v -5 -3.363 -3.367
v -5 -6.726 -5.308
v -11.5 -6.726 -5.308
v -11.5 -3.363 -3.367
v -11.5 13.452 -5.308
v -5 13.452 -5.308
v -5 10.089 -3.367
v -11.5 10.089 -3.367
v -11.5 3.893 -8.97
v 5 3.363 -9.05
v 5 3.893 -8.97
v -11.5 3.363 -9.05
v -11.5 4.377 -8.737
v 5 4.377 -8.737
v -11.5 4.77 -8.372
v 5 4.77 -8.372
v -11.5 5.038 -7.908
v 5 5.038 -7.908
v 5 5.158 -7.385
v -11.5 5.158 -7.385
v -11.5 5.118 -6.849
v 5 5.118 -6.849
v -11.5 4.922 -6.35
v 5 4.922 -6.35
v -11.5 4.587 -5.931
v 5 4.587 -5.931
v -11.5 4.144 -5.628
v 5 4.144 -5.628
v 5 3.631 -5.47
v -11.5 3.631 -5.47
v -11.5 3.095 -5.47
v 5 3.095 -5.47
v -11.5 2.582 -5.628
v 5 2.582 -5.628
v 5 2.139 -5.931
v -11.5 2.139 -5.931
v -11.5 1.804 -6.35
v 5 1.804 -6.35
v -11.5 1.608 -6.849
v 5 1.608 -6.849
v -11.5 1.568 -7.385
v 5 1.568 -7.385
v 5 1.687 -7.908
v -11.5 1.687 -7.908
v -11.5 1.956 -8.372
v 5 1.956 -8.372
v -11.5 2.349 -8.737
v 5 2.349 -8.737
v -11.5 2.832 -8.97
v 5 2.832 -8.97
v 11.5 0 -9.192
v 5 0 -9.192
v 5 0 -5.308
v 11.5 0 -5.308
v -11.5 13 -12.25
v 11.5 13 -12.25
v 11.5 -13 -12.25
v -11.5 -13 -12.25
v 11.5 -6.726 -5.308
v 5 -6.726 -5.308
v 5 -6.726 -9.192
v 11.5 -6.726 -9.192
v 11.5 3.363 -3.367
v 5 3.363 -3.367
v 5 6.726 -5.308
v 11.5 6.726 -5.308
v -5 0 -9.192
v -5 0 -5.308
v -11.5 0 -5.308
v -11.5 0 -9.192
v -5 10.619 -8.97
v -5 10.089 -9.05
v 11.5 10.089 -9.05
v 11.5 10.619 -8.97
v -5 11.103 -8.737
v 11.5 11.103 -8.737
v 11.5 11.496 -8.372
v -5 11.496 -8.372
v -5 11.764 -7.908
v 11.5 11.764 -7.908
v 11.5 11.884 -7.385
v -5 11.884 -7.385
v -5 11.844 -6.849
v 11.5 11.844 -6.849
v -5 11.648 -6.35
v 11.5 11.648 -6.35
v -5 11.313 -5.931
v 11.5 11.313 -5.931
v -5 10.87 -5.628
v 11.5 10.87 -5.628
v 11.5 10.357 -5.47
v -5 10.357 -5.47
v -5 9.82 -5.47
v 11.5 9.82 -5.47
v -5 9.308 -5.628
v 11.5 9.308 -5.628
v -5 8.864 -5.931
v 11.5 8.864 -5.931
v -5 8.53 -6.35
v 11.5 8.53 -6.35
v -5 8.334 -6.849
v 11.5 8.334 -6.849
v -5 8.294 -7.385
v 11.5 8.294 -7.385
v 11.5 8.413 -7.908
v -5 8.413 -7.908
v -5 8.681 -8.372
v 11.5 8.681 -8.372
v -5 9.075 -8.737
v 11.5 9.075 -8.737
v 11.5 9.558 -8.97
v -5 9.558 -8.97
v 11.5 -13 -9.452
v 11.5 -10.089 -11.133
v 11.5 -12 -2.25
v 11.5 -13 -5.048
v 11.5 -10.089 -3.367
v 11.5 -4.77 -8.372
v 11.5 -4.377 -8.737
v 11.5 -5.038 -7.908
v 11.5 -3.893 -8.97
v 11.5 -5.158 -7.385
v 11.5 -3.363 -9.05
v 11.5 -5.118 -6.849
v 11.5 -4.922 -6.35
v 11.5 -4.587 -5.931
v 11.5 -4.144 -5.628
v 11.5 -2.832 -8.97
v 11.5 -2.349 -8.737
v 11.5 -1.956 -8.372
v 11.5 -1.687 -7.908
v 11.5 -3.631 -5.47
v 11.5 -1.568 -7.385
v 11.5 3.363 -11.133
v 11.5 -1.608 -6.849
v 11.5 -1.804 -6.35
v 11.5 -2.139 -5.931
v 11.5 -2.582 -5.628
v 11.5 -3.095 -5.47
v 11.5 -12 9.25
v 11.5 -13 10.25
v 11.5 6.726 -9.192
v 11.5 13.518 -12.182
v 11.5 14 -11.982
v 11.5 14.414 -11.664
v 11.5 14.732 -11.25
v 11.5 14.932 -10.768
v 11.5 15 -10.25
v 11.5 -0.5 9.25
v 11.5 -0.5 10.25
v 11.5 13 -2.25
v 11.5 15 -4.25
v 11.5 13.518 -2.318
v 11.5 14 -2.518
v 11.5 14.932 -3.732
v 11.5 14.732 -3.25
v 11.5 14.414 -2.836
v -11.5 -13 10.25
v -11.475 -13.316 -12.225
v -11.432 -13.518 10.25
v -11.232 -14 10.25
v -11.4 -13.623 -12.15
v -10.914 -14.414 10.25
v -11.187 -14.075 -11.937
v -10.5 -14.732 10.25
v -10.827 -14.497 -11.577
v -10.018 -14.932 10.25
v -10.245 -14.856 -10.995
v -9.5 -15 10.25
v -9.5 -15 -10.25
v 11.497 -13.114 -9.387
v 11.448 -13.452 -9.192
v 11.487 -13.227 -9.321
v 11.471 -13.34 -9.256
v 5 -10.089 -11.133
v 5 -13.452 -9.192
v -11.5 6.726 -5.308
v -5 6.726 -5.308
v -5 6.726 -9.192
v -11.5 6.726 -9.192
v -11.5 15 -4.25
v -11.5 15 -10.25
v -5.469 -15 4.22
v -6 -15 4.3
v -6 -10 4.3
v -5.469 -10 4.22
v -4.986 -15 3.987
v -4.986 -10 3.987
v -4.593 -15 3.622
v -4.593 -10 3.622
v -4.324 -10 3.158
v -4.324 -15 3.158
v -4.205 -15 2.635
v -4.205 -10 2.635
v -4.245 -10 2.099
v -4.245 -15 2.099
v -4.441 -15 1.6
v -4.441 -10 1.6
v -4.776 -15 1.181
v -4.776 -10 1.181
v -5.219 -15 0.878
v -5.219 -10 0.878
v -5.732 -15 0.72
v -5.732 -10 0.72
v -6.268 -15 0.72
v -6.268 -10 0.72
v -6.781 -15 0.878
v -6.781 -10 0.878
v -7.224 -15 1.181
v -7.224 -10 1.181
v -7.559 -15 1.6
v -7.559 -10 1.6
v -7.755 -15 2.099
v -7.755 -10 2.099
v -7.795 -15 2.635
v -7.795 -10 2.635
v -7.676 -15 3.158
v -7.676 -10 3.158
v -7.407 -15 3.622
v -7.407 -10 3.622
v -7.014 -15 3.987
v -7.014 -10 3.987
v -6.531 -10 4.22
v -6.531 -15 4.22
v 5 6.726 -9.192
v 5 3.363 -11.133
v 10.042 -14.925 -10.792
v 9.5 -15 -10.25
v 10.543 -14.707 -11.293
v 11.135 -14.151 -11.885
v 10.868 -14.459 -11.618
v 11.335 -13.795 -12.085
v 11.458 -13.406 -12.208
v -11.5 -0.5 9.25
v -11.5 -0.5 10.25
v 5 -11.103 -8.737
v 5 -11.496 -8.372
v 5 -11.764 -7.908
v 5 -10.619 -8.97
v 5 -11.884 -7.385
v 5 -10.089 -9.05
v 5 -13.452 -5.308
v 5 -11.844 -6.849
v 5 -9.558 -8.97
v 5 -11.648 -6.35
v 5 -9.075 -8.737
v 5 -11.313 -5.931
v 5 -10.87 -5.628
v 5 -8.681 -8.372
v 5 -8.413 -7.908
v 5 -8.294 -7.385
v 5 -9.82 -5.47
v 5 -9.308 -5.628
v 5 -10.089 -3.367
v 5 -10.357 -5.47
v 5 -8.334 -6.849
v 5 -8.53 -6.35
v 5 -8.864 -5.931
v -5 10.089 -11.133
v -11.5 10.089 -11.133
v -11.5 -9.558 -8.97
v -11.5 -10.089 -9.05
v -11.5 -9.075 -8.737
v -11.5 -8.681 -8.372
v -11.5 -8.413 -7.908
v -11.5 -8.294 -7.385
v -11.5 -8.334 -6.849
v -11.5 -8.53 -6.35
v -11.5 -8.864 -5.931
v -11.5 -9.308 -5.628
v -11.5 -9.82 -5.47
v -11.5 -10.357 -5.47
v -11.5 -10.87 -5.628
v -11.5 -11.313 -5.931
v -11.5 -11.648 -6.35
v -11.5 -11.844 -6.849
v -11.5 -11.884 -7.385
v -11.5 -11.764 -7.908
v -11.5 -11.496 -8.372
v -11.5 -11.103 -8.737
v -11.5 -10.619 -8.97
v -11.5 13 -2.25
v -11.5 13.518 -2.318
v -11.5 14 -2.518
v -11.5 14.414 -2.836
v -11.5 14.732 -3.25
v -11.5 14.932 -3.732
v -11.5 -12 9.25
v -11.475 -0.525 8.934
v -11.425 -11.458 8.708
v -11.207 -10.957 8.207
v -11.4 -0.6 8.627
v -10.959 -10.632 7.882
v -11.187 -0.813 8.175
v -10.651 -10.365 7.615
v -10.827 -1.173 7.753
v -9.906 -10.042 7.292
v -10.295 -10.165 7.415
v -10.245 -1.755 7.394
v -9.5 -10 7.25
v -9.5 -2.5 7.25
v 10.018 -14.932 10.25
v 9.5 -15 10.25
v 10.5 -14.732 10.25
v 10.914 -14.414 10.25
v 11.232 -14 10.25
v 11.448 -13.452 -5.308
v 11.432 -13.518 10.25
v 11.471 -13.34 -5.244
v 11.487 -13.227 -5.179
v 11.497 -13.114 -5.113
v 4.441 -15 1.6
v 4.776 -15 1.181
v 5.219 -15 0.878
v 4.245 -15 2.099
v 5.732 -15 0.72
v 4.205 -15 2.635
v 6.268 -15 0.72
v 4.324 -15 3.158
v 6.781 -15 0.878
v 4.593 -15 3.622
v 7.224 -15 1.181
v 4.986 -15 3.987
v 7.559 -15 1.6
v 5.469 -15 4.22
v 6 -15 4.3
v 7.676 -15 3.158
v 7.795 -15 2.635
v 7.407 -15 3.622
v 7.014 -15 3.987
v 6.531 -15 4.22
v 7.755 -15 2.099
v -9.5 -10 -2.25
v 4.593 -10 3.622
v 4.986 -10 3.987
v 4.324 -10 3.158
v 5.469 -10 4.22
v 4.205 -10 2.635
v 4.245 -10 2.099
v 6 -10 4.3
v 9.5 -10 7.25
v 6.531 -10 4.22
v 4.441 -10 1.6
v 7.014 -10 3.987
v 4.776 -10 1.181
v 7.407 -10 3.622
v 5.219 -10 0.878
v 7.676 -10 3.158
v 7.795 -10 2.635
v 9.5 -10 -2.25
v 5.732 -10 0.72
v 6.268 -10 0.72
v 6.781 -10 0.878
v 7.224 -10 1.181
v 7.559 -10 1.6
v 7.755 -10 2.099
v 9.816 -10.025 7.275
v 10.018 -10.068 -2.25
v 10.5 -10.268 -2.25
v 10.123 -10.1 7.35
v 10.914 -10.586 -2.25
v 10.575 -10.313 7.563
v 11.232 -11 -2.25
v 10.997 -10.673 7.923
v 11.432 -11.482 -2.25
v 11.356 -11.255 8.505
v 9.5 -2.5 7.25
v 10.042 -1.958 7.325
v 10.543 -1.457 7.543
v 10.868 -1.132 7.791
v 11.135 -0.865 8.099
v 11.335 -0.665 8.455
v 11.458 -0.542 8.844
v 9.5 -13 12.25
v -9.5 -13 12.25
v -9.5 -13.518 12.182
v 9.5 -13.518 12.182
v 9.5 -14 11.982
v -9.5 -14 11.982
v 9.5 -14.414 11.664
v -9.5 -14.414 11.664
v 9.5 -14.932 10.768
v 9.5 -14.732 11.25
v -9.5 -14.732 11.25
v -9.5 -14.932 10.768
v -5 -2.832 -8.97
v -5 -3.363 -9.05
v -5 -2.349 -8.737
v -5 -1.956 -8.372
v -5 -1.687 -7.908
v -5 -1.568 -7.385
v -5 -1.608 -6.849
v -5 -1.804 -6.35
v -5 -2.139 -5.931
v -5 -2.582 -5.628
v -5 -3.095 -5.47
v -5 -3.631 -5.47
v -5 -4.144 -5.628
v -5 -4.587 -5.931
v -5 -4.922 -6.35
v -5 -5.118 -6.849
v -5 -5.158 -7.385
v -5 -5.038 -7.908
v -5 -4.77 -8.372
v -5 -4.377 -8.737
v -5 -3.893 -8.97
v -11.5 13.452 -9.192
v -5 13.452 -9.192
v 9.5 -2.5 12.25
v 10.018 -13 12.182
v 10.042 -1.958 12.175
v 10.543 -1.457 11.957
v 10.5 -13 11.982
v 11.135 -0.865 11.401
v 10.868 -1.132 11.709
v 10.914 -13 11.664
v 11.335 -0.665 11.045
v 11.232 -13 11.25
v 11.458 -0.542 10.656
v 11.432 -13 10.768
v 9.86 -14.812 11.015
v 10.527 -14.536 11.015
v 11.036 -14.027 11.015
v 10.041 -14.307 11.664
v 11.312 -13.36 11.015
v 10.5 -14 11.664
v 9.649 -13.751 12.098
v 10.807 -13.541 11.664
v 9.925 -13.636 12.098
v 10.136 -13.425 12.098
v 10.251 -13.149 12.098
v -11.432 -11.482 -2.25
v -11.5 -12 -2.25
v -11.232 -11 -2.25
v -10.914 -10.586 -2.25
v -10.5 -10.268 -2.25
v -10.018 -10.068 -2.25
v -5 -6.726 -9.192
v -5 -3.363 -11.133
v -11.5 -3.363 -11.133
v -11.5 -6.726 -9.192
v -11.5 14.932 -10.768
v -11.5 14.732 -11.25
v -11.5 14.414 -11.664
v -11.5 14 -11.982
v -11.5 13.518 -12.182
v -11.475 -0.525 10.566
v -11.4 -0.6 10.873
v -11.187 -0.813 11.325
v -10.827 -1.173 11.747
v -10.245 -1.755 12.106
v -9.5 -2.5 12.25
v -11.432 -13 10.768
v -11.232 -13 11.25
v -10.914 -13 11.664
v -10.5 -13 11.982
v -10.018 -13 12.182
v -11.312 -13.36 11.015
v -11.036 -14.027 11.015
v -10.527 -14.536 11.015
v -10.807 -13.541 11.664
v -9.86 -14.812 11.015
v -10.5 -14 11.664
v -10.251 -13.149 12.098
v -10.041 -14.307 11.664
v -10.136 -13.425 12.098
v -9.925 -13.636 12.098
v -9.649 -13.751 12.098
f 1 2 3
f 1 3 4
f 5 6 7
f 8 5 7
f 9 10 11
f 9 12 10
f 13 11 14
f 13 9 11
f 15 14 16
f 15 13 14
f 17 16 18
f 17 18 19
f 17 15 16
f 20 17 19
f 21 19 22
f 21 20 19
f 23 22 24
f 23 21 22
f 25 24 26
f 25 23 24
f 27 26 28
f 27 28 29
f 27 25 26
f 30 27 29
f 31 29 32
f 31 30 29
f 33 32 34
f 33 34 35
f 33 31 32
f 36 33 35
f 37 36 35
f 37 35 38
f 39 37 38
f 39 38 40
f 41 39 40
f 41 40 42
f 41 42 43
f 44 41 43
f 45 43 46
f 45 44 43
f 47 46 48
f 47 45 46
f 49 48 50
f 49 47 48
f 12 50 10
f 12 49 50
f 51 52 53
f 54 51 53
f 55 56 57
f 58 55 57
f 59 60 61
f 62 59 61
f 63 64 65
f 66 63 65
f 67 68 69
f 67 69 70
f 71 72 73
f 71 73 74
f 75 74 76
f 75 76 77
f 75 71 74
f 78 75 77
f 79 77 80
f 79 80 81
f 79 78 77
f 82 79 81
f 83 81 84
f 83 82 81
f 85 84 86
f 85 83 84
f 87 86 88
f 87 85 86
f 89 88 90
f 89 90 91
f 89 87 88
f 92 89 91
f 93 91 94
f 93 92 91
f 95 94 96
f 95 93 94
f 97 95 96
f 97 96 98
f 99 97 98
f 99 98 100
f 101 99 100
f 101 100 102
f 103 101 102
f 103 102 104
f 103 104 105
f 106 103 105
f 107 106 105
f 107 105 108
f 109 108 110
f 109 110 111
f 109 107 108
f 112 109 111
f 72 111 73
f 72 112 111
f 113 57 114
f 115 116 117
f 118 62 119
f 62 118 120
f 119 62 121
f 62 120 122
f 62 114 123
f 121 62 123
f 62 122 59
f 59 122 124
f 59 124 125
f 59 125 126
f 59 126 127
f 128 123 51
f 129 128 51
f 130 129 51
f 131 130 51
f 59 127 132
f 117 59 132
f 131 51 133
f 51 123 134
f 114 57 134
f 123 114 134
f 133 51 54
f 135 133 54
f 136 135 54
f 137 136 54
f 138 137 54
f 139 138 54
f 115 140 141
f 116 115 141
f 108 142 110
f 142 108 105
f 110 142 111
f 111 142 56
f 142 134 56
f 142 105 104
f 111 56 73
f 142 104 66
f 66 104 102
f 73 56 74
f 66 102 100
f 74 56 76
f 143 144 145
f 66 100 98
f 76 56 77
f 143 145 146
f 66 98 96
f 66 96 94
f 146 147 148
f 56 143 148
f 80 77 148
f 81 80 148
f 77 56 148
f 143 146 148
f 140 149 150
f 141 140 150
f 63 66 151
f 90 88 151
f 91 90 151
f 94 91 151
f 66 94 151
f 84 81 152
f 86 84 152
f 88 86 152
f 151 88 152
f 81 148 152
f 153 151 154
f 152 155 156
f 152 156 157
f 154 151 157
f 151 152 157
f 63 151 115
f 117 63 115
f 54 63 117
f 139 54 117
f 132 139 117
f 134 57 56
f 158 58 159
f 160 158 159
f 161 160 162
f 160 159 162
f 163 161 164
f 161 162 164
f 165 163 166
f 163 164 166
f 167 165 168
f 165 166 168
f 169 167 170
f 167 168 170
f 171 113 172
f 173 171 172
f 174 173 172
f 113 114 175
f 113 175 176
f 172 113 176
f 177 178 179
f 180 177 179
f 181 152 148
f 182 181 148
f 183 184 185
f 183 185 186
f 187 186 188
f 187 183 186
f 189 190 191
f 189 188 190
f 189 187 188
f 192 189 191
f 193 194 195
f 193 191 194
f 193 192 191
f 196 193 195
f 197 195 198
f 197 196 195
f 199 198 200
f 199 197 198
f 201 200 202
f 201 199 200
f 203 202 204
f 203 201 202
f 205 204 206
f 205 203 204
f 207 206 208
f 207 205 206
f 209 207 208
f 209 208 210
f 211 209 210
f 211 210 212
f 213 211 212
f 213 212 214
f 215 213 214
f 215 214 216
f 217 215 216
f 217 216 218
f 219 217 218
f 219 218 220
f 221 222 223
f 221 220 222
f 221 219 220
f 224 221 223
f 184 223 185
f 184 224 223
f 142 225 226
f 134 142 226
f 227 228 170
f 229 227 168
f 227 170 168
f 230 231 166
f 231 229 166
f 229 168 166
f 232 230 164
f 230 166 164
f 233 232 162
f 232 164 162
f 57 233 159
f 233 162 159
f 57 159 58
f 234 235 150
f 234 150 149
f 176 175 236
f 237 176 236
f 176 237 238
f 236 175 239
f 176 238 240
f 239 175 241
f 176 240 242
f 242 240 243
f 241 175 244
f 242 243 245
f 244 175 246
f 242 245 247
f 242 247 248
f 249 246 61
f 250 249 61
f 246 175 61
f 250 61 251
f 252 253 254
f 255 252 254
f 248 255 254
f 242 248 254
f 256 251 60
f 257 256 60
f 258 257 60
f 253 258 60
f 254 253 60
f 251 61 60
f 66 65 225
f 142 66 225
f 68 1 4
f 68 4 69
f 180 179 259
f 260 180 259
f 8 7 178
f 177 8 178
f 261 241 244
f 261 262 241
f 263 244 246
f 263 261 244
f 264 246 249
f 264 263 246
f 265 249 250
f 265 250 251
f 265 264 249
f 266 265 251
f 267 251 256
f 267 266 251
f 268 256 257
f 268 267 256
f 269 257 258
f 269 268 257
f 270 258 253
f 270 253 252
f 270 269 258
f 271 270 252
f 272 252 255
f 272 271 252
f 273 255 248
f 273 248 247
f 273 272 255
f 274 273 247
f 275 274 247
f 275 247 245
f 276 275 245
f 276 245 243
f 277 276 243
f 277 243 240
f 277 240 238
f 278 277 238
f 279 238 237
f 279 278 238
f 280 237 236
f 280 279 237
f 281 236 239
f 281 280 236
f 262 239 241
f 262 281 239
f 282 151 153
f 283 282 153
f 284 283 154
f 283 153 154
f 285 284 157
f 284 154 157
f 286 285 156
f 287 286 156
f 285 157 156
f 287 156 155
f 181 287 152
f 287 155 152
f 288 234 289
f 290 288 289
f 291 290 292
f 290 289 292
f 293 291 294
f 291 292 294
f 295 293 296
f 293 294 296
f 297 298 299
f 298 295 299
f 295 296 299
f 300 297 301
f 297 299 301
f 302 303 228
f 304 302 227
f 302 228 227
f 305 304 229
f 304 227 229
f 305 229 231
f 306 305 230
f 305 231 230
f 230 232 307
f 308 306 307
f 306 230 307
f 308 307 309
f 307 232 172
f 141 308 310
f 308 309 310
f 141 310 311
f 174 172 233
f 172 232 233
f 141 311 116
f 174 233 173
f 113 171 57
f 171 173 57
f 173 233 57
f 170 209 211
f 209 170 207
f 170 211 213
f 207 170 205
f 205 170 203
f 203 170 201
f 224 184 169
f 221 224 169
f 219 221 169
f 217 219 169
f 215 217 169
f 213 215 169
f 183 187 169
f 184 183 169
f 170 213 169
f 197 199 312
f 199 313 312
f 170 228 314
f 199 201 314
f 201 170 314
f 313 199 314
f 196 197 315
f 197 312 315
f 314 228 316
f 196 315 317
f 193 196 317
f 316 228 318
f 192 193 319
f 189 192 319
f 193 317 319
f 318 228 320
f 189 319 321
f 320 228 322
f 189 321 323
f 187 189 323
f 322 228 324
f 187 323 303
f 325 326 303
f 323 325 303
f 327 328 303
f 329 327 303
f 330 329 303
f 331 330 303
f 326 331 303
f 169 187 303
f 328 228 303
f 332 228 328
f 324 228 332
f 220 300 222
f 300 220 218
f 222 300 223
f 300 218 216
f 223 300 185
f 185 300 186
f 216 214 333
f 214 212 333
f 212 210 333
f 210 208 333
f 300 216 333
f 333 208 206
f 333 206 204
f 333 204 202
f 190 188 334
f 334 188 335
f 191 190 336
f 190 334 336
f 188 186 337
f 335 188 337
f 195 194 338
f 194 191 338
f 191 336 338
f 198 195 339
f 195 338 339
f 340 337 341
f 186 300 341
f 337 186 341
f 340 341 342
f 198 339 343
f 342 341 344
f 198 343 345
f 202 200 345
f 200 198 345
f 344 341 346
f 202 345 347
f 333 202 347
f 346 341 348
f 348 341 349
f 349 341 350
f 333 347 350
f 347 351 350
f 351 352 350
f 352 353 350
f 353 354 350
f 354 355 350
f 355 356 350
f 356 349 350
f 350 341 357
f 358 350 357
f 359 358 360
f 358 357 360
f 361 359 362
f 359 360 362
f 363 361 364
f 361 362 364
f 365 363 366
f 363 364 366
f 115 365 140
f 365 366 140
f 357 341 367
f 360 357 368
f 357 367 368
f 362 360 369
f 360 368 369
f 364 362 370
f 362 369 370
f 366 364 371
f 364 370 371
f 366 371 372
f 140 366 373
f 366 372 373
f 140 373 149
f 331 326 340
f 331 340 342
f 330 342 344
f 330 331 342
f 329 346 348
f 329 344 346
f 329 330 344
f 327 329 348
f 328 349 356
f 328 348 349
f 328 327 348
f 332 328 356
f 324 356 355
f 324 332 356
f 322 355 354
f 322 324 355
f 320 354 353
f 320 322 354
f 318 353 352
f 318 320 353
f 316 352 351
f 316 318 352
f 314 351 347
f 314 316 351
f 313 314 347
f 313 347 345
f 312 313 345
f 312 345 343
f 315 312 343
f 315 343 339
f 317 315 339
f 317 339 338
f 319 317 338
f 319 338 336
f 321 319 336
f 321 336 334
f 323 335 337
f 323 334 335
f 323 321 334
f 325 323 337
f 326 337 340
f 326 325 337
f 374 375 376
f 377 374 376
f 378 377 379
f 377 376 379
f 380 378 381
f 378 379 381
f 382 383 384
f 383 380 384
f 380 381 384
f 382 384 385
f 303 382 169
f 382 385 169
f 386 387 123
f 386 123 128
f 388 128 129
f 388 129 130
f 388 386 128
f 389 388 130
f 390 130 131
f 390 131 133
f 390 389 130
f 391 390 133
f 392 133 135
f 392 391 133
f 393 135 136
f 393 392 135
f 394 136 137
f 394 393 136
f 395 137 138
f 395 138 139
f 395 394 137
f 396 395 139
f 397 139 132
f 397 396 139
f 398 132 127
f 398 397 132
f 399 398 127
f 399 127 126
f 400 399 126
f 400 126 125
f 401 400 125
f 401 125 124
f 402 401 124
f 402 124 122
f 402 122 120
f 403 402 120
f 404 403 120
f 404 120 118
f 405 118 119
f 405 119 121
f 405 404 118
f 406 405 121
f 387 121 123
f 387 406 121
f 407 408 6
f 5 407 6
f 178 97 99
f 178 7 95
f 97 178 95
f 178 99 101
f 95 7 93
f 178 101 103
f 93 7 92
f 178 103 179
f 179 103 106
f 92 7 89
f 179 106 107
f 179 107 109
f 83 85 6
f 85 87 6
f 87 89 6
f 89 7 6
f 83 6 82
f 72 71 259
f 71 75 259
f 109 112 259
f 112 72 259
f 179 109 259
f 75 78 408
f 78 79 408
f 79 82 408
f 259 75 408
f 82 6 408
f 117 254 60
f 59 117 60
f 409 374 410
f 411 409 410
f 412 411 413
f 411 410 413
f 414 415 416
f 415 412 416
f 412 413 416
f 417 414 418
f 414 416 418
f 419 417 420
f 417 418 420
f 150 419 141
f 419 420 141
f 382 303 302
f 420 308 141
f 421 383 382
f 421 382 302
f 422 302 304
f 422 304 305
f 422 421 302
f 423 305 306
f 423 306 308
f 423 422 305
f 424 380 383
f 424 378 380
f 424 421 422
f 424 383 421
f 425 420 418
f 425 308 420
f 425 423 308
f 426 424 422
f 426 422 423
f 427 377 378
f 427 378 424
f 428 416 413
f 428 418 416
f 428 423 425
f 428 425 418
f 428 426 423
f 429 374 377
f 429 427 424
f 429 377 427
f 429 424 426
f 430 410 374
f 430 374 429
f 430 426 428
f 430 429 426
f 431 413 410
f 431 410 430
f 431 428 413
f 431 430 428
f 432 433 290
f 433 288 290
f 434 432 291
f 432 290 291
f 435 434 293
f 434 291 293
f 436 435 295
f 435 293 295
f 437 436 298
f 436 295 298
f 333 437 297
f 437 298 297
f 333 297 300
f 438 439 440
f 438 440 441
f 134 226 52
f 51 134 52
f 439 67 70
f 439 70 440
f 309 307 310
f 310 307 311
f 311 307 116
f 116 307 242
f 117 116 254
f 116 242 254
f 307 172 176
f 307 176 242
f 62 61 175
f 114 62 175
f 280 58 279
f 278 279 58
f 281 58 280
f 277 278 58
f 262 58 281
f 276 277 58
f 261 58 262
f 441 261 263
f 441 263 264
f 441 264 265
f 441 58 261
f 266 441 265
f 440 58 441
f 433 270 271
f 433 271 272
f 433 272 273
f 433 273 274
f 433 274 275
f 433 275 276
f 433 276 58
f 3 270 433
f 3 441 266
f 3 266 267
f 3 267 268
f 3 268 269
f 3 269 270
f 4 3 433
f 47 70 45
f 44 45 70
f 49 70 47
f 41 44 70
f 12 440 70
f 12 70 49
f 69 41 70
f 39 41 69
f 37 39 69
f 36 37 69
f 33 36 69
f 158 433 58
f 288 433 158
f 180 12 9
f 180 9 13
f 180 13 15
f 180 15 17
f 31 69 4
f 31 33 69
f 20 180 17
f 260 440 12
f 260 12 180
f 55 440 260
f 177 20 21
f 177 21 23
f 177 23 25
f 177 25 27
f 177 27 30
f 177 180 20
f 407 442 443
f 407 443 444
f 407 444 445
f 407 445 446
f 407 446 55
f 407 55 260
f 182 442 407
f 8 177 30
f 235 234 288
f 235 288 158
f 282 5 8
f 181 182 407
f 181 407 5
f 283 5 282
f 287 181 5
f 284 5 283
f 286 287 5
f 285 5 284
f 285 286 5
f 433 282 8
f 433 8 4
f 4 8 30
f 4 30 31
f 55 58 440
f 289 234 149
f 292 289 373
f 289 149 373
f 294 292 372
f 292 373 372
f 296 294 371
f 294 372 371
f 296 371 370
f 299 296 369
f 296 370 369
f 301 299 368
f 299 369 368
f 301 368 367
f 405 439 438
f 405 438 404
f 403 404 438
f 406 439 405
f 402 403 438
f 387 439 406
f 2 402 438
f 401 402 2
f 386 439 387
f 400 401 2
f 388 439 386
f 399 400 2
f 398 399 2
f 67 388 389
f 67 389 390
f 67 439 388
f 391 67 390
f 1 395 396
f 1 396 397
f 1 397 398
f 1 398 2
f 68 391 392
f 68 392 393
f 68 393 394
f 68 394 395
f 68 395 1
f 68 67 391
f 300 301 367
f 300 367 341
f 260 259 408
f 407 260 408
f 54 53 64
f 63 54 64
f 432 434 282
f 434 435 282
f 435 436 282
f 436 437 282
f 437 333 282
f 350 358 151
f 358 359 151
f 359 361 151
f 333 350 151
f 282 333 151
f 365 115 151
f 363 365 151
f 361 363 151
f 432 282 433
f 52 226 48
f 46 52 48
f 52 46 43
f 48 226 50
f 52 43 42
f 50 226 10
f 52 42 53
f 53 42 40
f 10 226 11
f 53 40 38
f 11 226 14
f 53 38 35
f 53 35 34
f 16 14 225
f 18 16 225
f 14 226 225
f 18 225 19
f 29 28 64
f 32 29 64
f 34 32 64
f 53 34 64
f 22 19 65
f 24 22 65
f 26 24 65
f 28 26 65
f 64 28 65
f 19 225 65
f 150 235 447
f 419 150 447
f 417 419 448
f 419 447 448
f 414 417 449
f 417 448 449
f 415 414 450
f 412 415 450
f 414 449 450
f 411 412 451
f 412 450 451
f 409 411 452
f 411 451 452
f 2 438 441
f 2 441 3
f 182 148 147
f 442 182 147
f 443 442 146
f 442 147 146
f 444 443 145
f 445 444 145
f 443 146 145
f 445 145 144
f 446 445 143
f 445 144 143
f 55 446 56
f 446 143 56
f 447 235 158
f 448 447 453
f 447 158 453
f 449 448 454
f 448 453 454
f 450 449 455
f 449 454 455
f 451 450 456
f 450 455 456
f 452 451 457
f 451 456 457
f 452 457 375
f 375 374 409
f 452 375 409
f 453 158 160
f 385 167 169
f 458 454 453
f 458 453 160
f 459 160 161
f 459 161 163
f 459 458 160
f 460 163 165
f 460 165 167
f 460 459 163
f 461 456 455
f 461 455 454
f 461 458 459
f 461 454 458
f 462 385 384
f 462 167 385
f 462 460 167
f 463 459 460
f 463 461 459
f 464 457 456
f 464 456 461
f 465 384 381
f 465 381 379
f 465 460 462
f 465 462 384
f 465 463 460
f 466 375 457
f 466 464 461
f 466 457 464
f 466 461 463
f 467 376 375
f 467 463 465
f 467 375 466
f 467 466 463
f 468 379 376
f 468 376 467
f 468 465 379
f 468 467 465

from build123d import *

# Parameters (mm, degrees)
SKETCH1_R               = 1.8
BOSS_EXTRUDE1_DEPTH     = 11.5
CUT_EXTRUDE1_START      = -5
SKETCH1_3_R             = 1.8
CUT_EXTRUDE1_DEPTH      = 18.523598736
CUT_EXTRUDE2_START      = 5
SKETCH1_4_R             = 1.8
CUT_EXTRUDE2_DEPTH      = 18.523598736
CUT_EXTRUDE3_DEPTH      = 23.523598736
CUT_EXTRUDE3_DEPTH_BACK = 23.523598736
SKETCH2_R               = 1.8
FILLET1_R               = 2


with BuildPart() as part:
    # Sketch1 → Boss-Extrude1 (new, symmetric)
    with BuildSketch(Plane(origin=(0, 0, 0), x_dir=(0, 0, -1), z_dir=(1, 0, 0))):
        Polygon((-12.25, -0.5), (-7.25, -0.5), (-7.25, -10), (2.25, -10), (2.25, 15), (12.25, 15), (12.25, -15), (-12.25, -15), align=None)
        with Locations((7.25, 10.0887)):
            Circle(SKETCH1_R, mode=Mode.SUBTRACT)
        with Locations((7.25, 3.3629)):
            Circle(SKETCH1_R, mode=Mode.SUBTRACT)
        with Locations((7.25, -3.3629)):
            Circle(SKETCH1_R, mode=Mode.SUBTRACT)
        with Locations((7.25, -10.0887)):
            Circle(SKETCH1_R, mode=Mode.SUBTRACT)
    extrude(amount=BOSS_EXTRUDE1_DEPTH, both=True)

    # Sketch1<3> → Cut-Extrude1 (cut, through all)
    # profile 1 of 2: a face of its own
    with BuildSketch(Plane(origin=(0, 0, 0), x_dir=(0, 0, -1), z_dir=(1, 0, 0)).offset(CUT_EXTRUDE1_START)):
        Polygon((9.19157122, 13.4516), (5.30842878, 13.4516), (3.366857559, 10.0887), (5.30842878, 6.7258), (9.19157122, 6.7258), (11.133142441, 10.0887), align=None)
        with Locations((7.25, 10.0887)):
            Circle(SKETCH1_3_R, mode=Mode.SUBTRACT)
    # profile 2 of 2: a face of its own
    with BuildSketch(Plane(origin=(0, 0, 0), x_dir=(0, 0, -1), z_dir=(1, 0, 0)).offset(CUT_EXTRUDE1_START)):
        Polygon((5.30842878, 0), (9.19157122, 0), (11.133142441, -3.3629), (9.19157122, -6.7258), (5.30842878, -6.7258), (3.366857559, -3.3629), align=None)
        with Locations((7.25, -3.3629)):
            Circle(SKETCH1_3_R, mode=Mode.SUBTRACT)
    extrude(amount=-CUT_EXTRUDE1_DEPTH, mode=Mode.SUBTRACT)

    # Sketch1<4> → Cut-Extrude2 (cut, through all)
    # profile 1 of 2: a face of its own
    with BuildSketch(Plane(origin=(0, 0, 0), x_dir=(0, 0, -1), z_dir=(1, 0, 0)).offset(CUT_EXTRUDE2_START)):
        Polygon((5.30842878, 6.7258), (9.19157122, 6.7258), (11.133142441, 3.3629), (9.19157122, 0), (5.30842878, 0), (3.366857559, 3.3629), align=None)
        with Locations((7.25, 3.3629)):
            Circle(SKETCH1_4_R, mode=Mode.SUBTRACT)
    # profile 2 of 2: a face of its own
    with BuildSketch(Plane(origin=(0, 0, 0), x_dir=(0, 0, -1), z_dir=(1, 0, 0)).offset(CUT_EXTRUDE2_START)):
        Polygon((5.30842878, -6.7258), (9.19157122, -6.7258), (11.133142441, -10.0887), (9.19157122, -13.4516), (5.30842878, -13.4516), (3.366857559, -10.0887), align=None)
        with Locations((7.25, -10.0887)):
            Circle(SKETCH1_4_R, mode=Mode.SUBTRACT)
    extrude(amount=CUT_EXTRUDE2_DEPTH, mode=Mode.SUBTRACT)

    # Sketch2 → Cut-Extrude3 (cut, two sides: drawn at the far end of the back side and taken through both)
    with BuildSketch(Plane(origin=(0, 0, 0), x_dir=(1, 0, 0), z_dir=(0, 1, 0)).offset(-CUT_EXTRUDE3_DEPTH_BACK)):
        with Locations(Location((-6, -2.5, 0), (0, 0, 270))):
            Circle(SKETCH2_R)
        with Locations(Location((6, -2.5, 0), (0, 0, 270))):
            Circle(SKETCH2_R)
    extrude(amount=CUT_EXTRUDE3_DEPTH + CUT_EXTRUDE3_DEPTH_BACK, mode=Mode.SUBTRACT)

    # Fillet1
    # the kernel refuses this fillet: 2 mm, written as the material it takes off along each edge
    with BuildSketch(Plane(origin=(-9.5, -13, 10.25), x_dir=(-1, 0, 0), z_dir=(0, 0, 1))) as fillet1_piece_1_section:
        Polygon((0, 0), (FILLET1_R * 1.02, 0), (FILLET1_R * 1.02, FILLET1_R * 1.02), (0, FILLET1_R * 1.02), align=None)
    fillet1_piece_1 = extrude(amount=FILLET1_R * 1.02, mode=Mode.PRIVATE)
    fillet1_piece_1 = fillet1_piece_1 - Plane(origin=(-9.5, -13, 10.25), x_dir=(0.7071067811865475, 0.7071067811865475, 0), z_dir=(0, 0, 1)) * Sphere(FILLET1_R, mode=Mode.PRIVATE)
    add(fillet1_piece_1, mode=Mode.SUBTRACT)
    with BuildSketch(Plane(origin=(9.5, -13, 10.25), x_dir=(1, 0, 0), z_dir=(0, 0, 1))) as fillet1_piece_2_section:
        Polygon((0, 0), (FILLET1_R * 1.02, 0), (FILLET1_R * 1.02, -FILLET1_R * 1.02), (0, -FILLET1_R * 1.02), align=None)
    fillet1_piece_2 = extrude(amount=FILLET1_R * 1.02, mode=Mode.PRIVATE)
    fillet1_piece_2 = fillet1_piece_2 - Plane(origin=(9.5, -13, 10.25), x_dir=(-0.7071067811865475, 0.7071067811865475, 0), z_dir=(0, 0, 1)) * Sphere(FILLET1_R, mode=Mode.PRIVATE)
    add(fillet1_piece_2, mode=Mode.SUBTRACT)
    with BuildSketch(Plane(origin=(-11.5, -10, 7.25), x_dir=(0, -1, 0), z_dir=(0, 0, -1)), Plane(origin=(-11.5, -0.5, 7.25), x_dir=(0, 0, 1), z_dir=(0, -1, 0)), Plane(origin=(11.5, -0.5, 7.25), x_dir=(-1, 0, 0), z_dir=(0, -1, 0))) as fillet1_piece_3:
        with BuildLine():
            CenterArc((FILLET1_R, -FILLET1_R), FILLET1_R, 90, 90)
            Line((0, -FILLET1_R), (-FILLET1_R * 0.02, -FILLET1_R))
            Line((-FILLET1_R * 0.02, -FILLET1_R), (-FILLET1_R * 0.02, FILLET1_R * 0.02))
            Line((-FILLET1_R * 0.02, FILLET1_R * 0.02), (FILLET1_R, FILLET1_R * 0.02))
            Line((FILLET1_R, FILLET1_R * 0.02), (FILLET1_R, 0))
        make_face()
    extrude(amount=9.5, mode=Mode.SUBTRACT)
    with BuildSketch(Plane(origin=(11.5, -10, 7.25), x_dir=(0, -1, 0), z_dir=(0, 0, -1))) as fillet1_piece_4:
        with BuildLine():
            CenterArc((FILLET1_R, FILLET1_R), FILLET1_R, 180, 90)
            Line((0, FILLET1_R), (-FILLET1_R * 0.02, FILLET1_R))
            Line((-FILLET1_R * 0.02, FILLET1_R), (-FILLET1_R * 0.02, -FILLET1_R * 0.02))
            Line((-FILLET1_R * 0.02, -FILLET1_R * 0.02), (FILLET1_R, -FILLET1_R * 0.02))
            Line((FILLET1_R, -FILLET1_R * 0.02), (FILLET1_R, 0))
        make_face()
    extrude(amount=9.5, mode=Mode.SUBTRACT)
    with BuildSketch(Plane(origin=(-11.5, -15, -12.25), x_dir=(0, 1, 0), z_dir=(0, 0, 1))) as fillet1_piece_5:
        with BuildLine():
            CenterArc((FILLET1_R, -FILLET1_R), FILLET1_R, 90, 90)
            Line((0, -FILLET1_R), (-FILLET1_R * 0.02, -FILLET1_R))
            Line((-FILLET1_R * 0.02, -FILLET1_R), (-FILLET1_R * 0.02, FILLET1_R * 0.02))
            Line((-FILLET1_R * 0.02, FILLET1_R * 0.02), (FILLET1_R, FILLET1_R * 0.02))
            Line((FILLET1_R, FILLET1_R * 0.02), (FILLET1_R, 0))
        make_face()
    extrude(amount=22.5, mode=Mode.SUBTRACT)
    with BuildSketch(Plane(origin=(11.5, -15, -12.25), x_dir=(0, 1, 0), z_dir=(0, 0, 1))) as fillet1_piece_6:
        with BuildLine():
            CenterArc((FILLET1_R, FILLET1_R), FILLET1_R, 180, 90)
            Line((0, FILLET1_R), (-FILLET1_R * 0.02, FILLET1_R))
            Line((-FILLET1_R * 0.02, FILLET1_R), (-FILLET1_R * 0.02, -FILLET1_R * 0.02))
            Line((-FILLET1_R * 0.02, -FILLET1_R * 0.02), (FILLET1_R, -FILLET1_R * 0.02))
            Line((FILLET1_R, -FILLET1_R * 0.02), (FILLET1_R, 0))
        make_face()
    extrude(amount=22.5, mode=Mode.SUBTRACT)
    with BuildSketch(Plane(origin=(-11.5, -13, 12.25), x_dir=(1, 0, 0), z_dir=(0, 1, 0))) as fillet1_piece_7:
        with BuildLine():
            CenterArc((FILLET1_R, FILLET1_R), FILLET1_R, 180, 90)
            Line((0, FILLET1_R), (-FILLET1_R * 0.02, FILLET1_R))
            Line((-FILLET1_R * 0.02, FILLET1_R), (-FILLET1_R * 0.02, -FILLET1_R * 0.02))
            Line((-FILLET1_R * 0.02, -FILLET1_R * 0.02), (FILLET1_R, -FILLET1_R * 0.02))
            Line((FILLET1_R, -FILLET1_R * 0.02), (FILLET1_R, 0))
        make_face()
    extrude(amount=12.5, mode=Mode.SUBTRACT)
    with BuildSketch(Plane(origin=(11.5, -13, 12.25), x_dir=(-1, 0, 0), z_dir=(0, 1, 0))) as fillet1_piece_8:
        with BuildLine():
            CenterArc((FILLET1_R, -FILLET1_R), FILLET1_R, 90, 90)
            Line((0, -FILLET1_R), (-FILLET1_R * 0.02, -FILLET1_R))
            Line((-FILLET1_R * 0.02, -FILLET1_R), (-FILLET1_R * 0.02, FILLET1_R * 0.02))
            Line((-FILLET1_R * 0.02, FILLET1_R * 0.02), (FILLET1_R, FILLET1_R * 0.02))
            Line((FILLET1_R, FILLET1_R * 0.02), (FILLET1_R, 0))
        make_face()
    extrude(amount=12.5, mode=Mode.SUBTRACT)
    with BuildSketch(Plane(origin=(11.5, 15, -2.25), x_dir=(0, -1, 0), z_dir=(-1, 0, 0)), Plane(origin=(-11.5, -15, -12.25), x_dir=(0, 0, 1), z_dir=(1, 0, 0)), Plane(origin=(11.5, -0.5, 7.25), x_dir=(0, 0, 1), z_dir=(-1, 0, 0)), Plane(origin=(-11.5, -0.5, 12.25), x_dir=(0, 0, -1), z_dir=(1, 0, 0))) as fillet1_piece_9:
        with BuildLine():
            CenterArc((FILLET1_R, -FILLET1_R), FILLET1_R, 90, 90)
            Line((0, -FILLET1_R), (-FILLET1_R * 0.02, -FILLET1_R))
            Line((-FILLET1_R * 0.02, -FILLET1_R), (-FILLET1_R * 0.02, FILLET1_R * 0.02))
            Line((-FILLET1_R * 0.02, FILLET1_R * 0.02), (FILLET1_R, FILLET1_R * 0.02))
            Line((FILLET1_R, FILLET1_R * 0.02), (FILLET1_R, 0))
        make_face()
    extrude(amount=23, mode=Mode.SUBTRACT)
    with BuildSketch(Plane(origin=(11.5, 15, -12.25), x_dir=(0, -1, 0), z_dir=(-1, 0, 0))) as fillet1_piece_10:
        with BuildLine():
            CenterArc((FILLET1_R, FILLET1_R), FILLET1_R, 180, 90)
            Line((0, FILLET1_R), (-FILLET1_R * 0.02, FILLET1_R))
            Line((-FILLET1_R * 0.02, FILLET1_R), (-FILLET1_R * 0.02, -FILLET1_R * 0.02))
            Line((-FILLET1_R * 0.02, -FILLET1_R * 0.02), (FILLET1_R, -FILLET1_R * 0.02))
            Line((FILLET1_R, -FILLET1_R * 0.02), (FILLET1_R, 0))
        make_face()
    extrude(amount=23, mode=Mode.SUBTRACT)
    with BuildSketch(Plane(origin=(-9.5, -15, 12.25), x_dir=(0, 1, 0), z_dir=(1, 0, 0))) as fillet1_piece_11:
        with BuildLine():
            CenterArc((FILLET1_R, -FILLET1_R), FILLET1_R, 90, 90)
            Line((0, -FILLET1_R), (-FILLET1_R * 0.02, -FILLET1_R))
            Line((-FILLET1_R * 0.02, -FILLET1_R), (-FILLET1_R * 0.02, FILLET1_R * 0.02))
            Line((-FILLET1_R * 0.02, FILLET1_R * 0.02), (FILLET1_R, FILLET1_R * 0.02))
            Line((FILLET1_R, FILLET1_R * 0.02), (FILLET1_R, 0))
        make_face()
    extrude(amount=19, mode=Mode.SUBTRACT)
    with BuildSketch(Plane(origin=(-11.5, -0.5, 7.25), x_dir=(0, 0, 1), z_dir=(0, -1, 0))) as fillet1_piece_12a_section:
        with BuildLine():
            CenterArc((FILLET1_R, -FILLET1_R), FILLET1_R, 90, 90)
            Line((0, -FILLET1_R), (-FILLET1_R * 0.02, -FILLET1_R))
            Line((-FILLET1_R * 0.02, -FILLET1_R), (-FILLET1_R * 0.02, FILLET1_R * 0.02))
            Line((-FILLET1_R * 0.02, FILLET1_R * 0.02), (FILLET1_R, FILLET1_R * 0.02))
            Line((FILLET1_R, FILLET1_R * 0.02), (FILLET1_R, 0))
        make_face()
    fillet1_piece_12a = extrude(amount=14.5, mode=Mode.PRIVATE)
    fillet1_piece_12a = split(fillet1_piece_12a, bisect_by=Plane(origin=(-11.047209771, -10, 7.702790229), z_dir=(0, -1, 0)), keep=Keep.TOP, mode=Mode.PRIVATE)
    with BuildSketch(Plane(origin=(-11.5, -10, 12.25), x_dir=(0, -1, 0), z_dir=(0, 0, -1))) as fillet1_piece_12b_section:
        with BuildLine():
            CenterArc((FILLET1_R, -FILLET1_R), FILLET1_R, 90, 90)
            Line((0, -FILLET1_R), (-FILLET1_R * 0.02, -FILLET1_R))
            Line((-FILLET1_R * 0.02, -FILLET1_R), (-FILLET1_R * 0.02, FILLET1_R * 0.02))
            Line((-FILLET1_R * 0.02, FILLET1_R * 0.02), (FILLET1_R, FILLET1_R * 0.02))
            Line((FILLET1_R, FILLET1_R * 0.02), (FILLET1_R, 0))
        make_face()
    fillet1_piece_12b = extrude(amount=14.5, mode=Mode.PRIVATE)
    fillet1_piece_12b = split(fillet1_piece_12b, bisect_by=Plane(origin=(-11.047209771, -10.452790229, 7.25), z_dir=(0, 0, 1)), keep=Keep.TOP, mode=Mode.PRIVATE)
    fillet1_piece_12 = fillet1_piece_12a & fillet1_piece_12b
    add(fillet1_piece_12, mode=Mode.SUBTRACT)
    with BuildSketch(Plane(origin=(11.5, -0.5, 7.25), x_dir=(-1, 0, 0), z_dir=(0, -1, 0))) as fillet1_piece_13a_section:
        with BuildLine():
            CenterArc((FILLET1_R, -FILLET1_R), FILLET1_R, 90, 90)
            Line((0, -FILLET1_R), (-FILLET1_R * 0.02, -FILLET1_R))
            Line((-FILLET1_R * 0.02, -FILLET1_R), (-FILLET1_R * 0.02, FILLET1_R * 0.02))
            Line((-FILLET1_R * 0.02, FILLET1_R * 0.02), (FILLET1_R, FILLET1_R * 0.02))
            Line((FILLET1_R, FILLET1_R * 0.02), (FILLET1_R, 0))
        make_face()
    fillet1_piece_13a = extrude(amount=14.5, mode=Mode.PRIVATE)
    fillet1_piece_13a = split(fillet1_piece_13a, bisect_by=Plane(origin=(11.047209771, -10, 7.702790229), z_dir=(0, -1, 0)), keep=Keep.TOP, mode=Mode.PRIVATE)
    with BuildSketch(Plane(origin=(11.5, -10, 12.25), x_dir=(0, -1, 0), z_dir=(0, 0, -1))) as fillet1_piece_13b_section:
        with BuildLine():
            CenterArc((FILLET1_R, FILLET1_R), FILLET1_R, 180, 90)
            Line((0, FILLET1_R), (-FILLET1_R * 0.02, FILLET1_R))
            Line((-FILLET1_R * 0.02, FILLET1_R), (-FILLET1_R * 0.02, -FILLET1_R * 0.02))
            Line((-FILLET1_R * 0.02, -FILLET1_R * 0.02), (FILLET1_R, -FILLET1_R * 0.02))
            Line((FILLET1_R, -FILLET1_R * 0.02), (FILLET1_R, 0))
        make_face()
    fillet1_piece_13b = extrude(amount=14.5, mode=Mode.PRIVATE)
    fillet1_piece_13b = split(fillet1_piece_13b, bisect_by=Plane(origin=(11.047209771, -10.452790229, 7.25), z_dir=(0, 0, 1)), keep=Keep.TOP, mode=Mode.PRIVATE)
    fillet1_piece_13 = fillet1_piece_13a & fillet1_piece_13b
    add(fillet1_piece_13, mode=Mode.SUBTRACT)
    with BuildSketch(Plane(origin=(11.5, -0.5, 7.25), x_dir=(0, 0, 1), z_dir=(-1, 0, 0))) as fillet1_piece_14a_section:
        with BuildLine():
            CenterArc((FILLET1_R, -FILLET1_R), FILLET1_R, 90, 90)
            Line((0, -FILLET1_R), (-FILLET1_R * 0.02, -FILLET1_R))
            Line((-FILLET1_R * 0.02, -FILLET1_R), (-FILLET1_R * 0.02, FILLET1_R * 0.02))
            Line((-FILLET1_R * 0.02, FILLET1_R * 0.02), (FILLET1_R, FILLET1_R * 0.02))
            Line((FILLET1_R, FILLET1_R * 0.02), (FILLET1_R, 0))
        make_face()
    fillet1_piece_14a = extrude(amount=28, mode=Mode.PRIVATE)
    fillet1_piece_14a = split(fillet1_piece_14a, bisect_by=Plane(origin=(-11.5, -0.952790229, 7.702790229), z_dir=(-1, 0, 0)), keep=Keep.TOP, mode=Mode.PRIVATE)
    with BuildSketch(Plane(origin=(-11.5, 4.5, 7.25), x_dir=(0, 0, 1), z_dir=(0, -1, 0))) as fillet1_piece_14b_section:
        with BuildLine():
            CenterArc((FILLET1_R, -FILLET1_R), FILLET1_R, 90, 90)
            Line((0, -FILLET1_R), (-FILLET1_R * 0.02, -FILLET1_R))
            Line((-FILLET1_R * 0.02, -FILLET1_R), (-FILLET1_R * 0.02, FILLET1_R * 0.02))
            Line((-FILLET1_R * 0.02, FILLET1_R * 0.02), (FILLET1_R, FILLET1_R * 0.02))
            Line((FILLET1_R, FILLET1_R * 0.02), (FILLET1_R, 0))
        make_face()
    fillet1_piece_14b = extrude(amount=14.5, mode=Mode.PRIVATE)
    fillet1_piece_14b = split(fillet1_piece_14b, bisect_by=Plane(origin=(-11.047209771, -0.5, 7.702790229), z_dir=(0, 1, 0)), keep=Keep.TOP, mode=Mode.PRIVATE)
    fillet1_piece_14 = fillet1_piece_14a & fillet1_piece_14b
    add(fillet1_piece_14, mode=Mode.SUBTRACT)
    with BuildSketch(Plane(origin=(16.5, -0.5, 7.25), x_dir=(0, 0, 1), z_dir=(-1, 0, 0))) as fillet1_piece_15a_section:
        with BuildLine():
            CenterArc((FILLET1_R, -FILLET1_R), FILLET1_R, 90, 90)
            Line((0, -FILLET1_R), (-FILLET1_R * 0.02, -FILLET1_R))
            Line((-FILLET1_R * 0.02, -FILLET1_R), (-FILLET1_R * 0.02, FILLET1_R * 0.02))
            Line((-FILLET1_R * 0.02, FILLET1_R * 0.02), (FILLET1_R, FILLET1_R * 0.02))
            Line((FILLET1_R, FILLET1_R * 0.02), (FILLET1_R, 0))
        make_face()
    fillet1_piece_15a = extrude(amount=28, mode=Mode.PRIVATE)
    fillet1_piece_15a = split(fillet1_piece_15a, bisect_by=Plane(origin=(11.5, -0.952790229, 7.702790229), z_dir=(1, 0, 0)), keep=Keep.TOP, mode=Mode.PRIVATE)
    with BuildSketch(Plane(origin=(11.5, 4.5, 7.25), x_dir=(-1, 0, 0), z_dir=(0, -1, 0))) as fillet1_piece_15b_section:
        with BuildLine():
            CenterArc((FILLET1_R, -FILLET1_R), FILLET1_R, 90, 90)
            Line((0, -FILLET1_R), (-FILLET1_R * 0.02, -FILLET1_R))
            Line((-FILLET1_R * 0.02, -FILLET1_R), (-FILLET1_R * 0.02, FILLET1_R * 0.02))
            Line((-FILLET1_R * 0.02, FILLET1_R * 0.02), (FILLET1_R, FILLET1_R * 0.02))
            Line((FILLET1_R, FILLET1_R * 0.02), (FILLET1_R, 0))
        make_face()
    fillet1_piece_15b = extrude(amount=14.5, mode=Mode.PRIVATE)
    fillet1_piece_15b = split(fillet1_piece_15b, bisect_by=Plane(origin=(11.047209771, -0.5, 7.702790229), z_dir=(0, 1, 0)), keep=Keep.TOP, mode=Mode.PRIVATE)
    fillet1_piece_15 = fillet1_piece_15a & fillet1_piece_15b
    add(fillet1_piece_15, mode=Mode.SUBTRACT)
    with BuildSketch(Plane(origin=(-11.5, -15, -17.25), x_dir=(0, 1, 0), z_dir=(0, 0, 1))) as fillet1_piece_16a_section:
        with BuildLine():
            CenterArc((FILLET1_R, -FILLET1_R), FILLET1_R, 90, 90)
            Line((0, -FILLET1_R), (-FILLET1_R * 0.02, -FILLET1_R))
            Line((-FILLET1_R * 0.02, -FILLET1_R), (-FILLET1_R * 0.02, FILLET1_R * 0.02))
            Line((-FILLET1_R * 0.02, FILLET1_R * 0.02), (FILLET1_R, FILLET1_R * 0.02))
            Line((FILLET1_R, FILLET1_R * 0.02), (FILLET1_R, 0))
        make_face()
    fillet1_piece_16a = extrude(amount=27.5, mode=Mode.PRIVATE)
    fillet1_piece_16a = split(fillet1_piece_16a, bisect_by=Plane(origin=(-11.047209771, -14.547209771, -12.25), z_dir=(0, 0, -1)), keep=Keep.TOP, mode=Mode.PRIVATE)
    with BuildSketch(Plane(origin=(-16.5, -15, -12.25), x_dir=(0, 0, 1), z_dir=(1, 0, 0))) as fillet1_piece_16b_section:
        with BuildLine():
            CenterArc((FILLET1_R, -FILLET1_R), FILLET1_R, 90, 90)
            Line((0, -FILLET1_R), (-FILLET1_R * 0.02, -FILLET1_R))
            Line((-FILLET1_R * 0.02, -FILLET1_R), (-FILLET1_R * 0.02, FILLET1_R * 0.02))
            Line((-FILLET1_R * 0.02, FILLET1_R * 0.02), (FILLET1_R, FILLET1_R * 0.02))
            Line((FILLET1_R, FILLET1_R * 0.02), (FILLET1_R, 0))
        make_face()
    fillet1_piece_16b = extrude(amount=28, mode=Mode.PRIVATE)
    fillet1_piece_16b = split(fillet1_piece_16b, bisect_by=Plane(origin=(-11.5, -14.547209771, -11.797209771), z_dir=(-1, 0, 0)), keep=Keep.TOP, mode=Mode.PRIVATE)
    fillet1_piece_16 = fillet1_piece_16a & fillet1_piece_16b
    add(fillet1_piece_16, mode=Mode.SUBTRACT)
    with BuildSketch(Plane(origin=(11.5, -15, -17.25), x_dir=(0, 1, 0), z_dir=(0, 0, 1))) as fillet1_piece_17a_section:
        with BuildLine():
            CenterArc((FILLET1_R, FILLET1_R), FILLET1_R, 180, 90)
            Line((0, FILLET1_R), (-FILLET1_R * 0.02, FILLET1_R))
            Line((-FILLET1_R * 0.02, FILLET1_R), (-FILLET1_R * 0.02, -FILLET1_R * 0.02))
            Line((-FILLET1_R * 0.02, -FILLET1_R * 0.02), (FILLET1_R, -FILLET1_R * 0.02))
            Line((FILLET1_R, -FILLET1_R * 0.02), (FILLET1_R, 0))
        make_face()
    fillet1_piece_17a = extrude(amount=27.5, mode=Mode.PRIVATE)
    fillet1_piece_17a = split(fillet1_piece_17a, bisect_by=Plane(origin=(11.047209771, -14.547209771, -12.25), z_dir=(0, 0, -1)), keep=Keep.TOP, mode=Mode.PRIVATE)
    with BuildSketch(Plane(origin=(-11.5, -15, -12.25), x_dir=(0, 0, 1), z_dir=(1, 0, 0))) as fillet1_piece_17b_section:
        with BuildLine():
            CenterArc((FILLET1_R, -FILLET1_R), FILLET1_R, 90, 90)
            Line((0, -FILLET1_R), (-FILLET1_R * 0.02, -FILLET1_R))
            Line((-FILLET1_R * 0.02, -FILLET1_R), (-FILLET1_R * 0.02, FILLET1_R * 0.02))
            Line((-FILLET1_R * 0.02, FILLET1_R * 0.02), (FILLET1_R, FILLET1_R * 0.02))
            Line((FILLET1_R, FILLET1_R * 0.02), (FILLET1_R, 0))
        make_face()
    fillet1_piece_17b = extrude(amount=28, mode=Mode.PRIVATE)
    fillet1_piece_17b = split(fillet1_piece_17b, bisect_by=Plane(origin=(11.5, -14.547209771, -11.797209771), z_dir=(1, 0, 0)), keep=Keep.TOP, mode=Mode.PRIVATE)
    fillet1_piece_17 = fillet1_piece_17a & fillet1_piece_17b
    add(fillet1_piece_17, mode=Mode.SUBTRACT)
    with BuildSketch(Plane(origin=(-16.5, -0.5, 12.25), x_dir=(0, 0, -1), z_dir=(1, 0, 0))) as fillet1_piece_18a_section:
        with BuildLine():
            CenterArc((FILLET1_R, -FILLET1_R), FILLET1_R, 90, 90)
            Line((0, -FILLET1_R), (-FILLET1_R * 0.02, -FILLET1_R))
            Line((-FILLET1_R * 0.02, -FILLET1_R), (-FILLET1_R * 0.02, FILLET1_R * 0.02))
            Line((-FILLET1_R * 0.02, FILLET1_R * 0.02), (FILLET1_R, FILLET1_R * 0.02))
            Line((FILLET1_R, FILLET1_R * 0.02), (FILLET1_R, 0))
        make_face()
    fillet1_piece_18a = extrude(amount=28, mode=Mode.PRIVATE)
    fillet1_piece_18a = split(fillet1_piece_18a, bisect_by=Plane(origin=(-11.5, -0.952790229, 11.797209771), z_dir=(-1, 0, 0)), keep=Keep.TOP, mode=Mode.PRIVATE)
    with BuildSketch(Plane(origin=(-11.5, -13, 12.25), x_dir=(1, 0, 0), z_dir=(0, 1, 0))) as fillet1_piece_18b_section:
        with BuildLine():
            CenterArc((FILLET1_R, FILLET1_R), FILLET1_R, 180, 90)
            Line((0, FILLET1_R), (-FILLET1_R * 0.02, FILLET1_R))
            Line((-FILLET1_R * 0.02, FILLET1_R), (-FILLET1_R * 0.02, -FILLET1_R * 0.02))
            Line((-FILLET1_R * 0.02, -FILLET1_R * 0.02), (FILLET1_R, -FILLET1_R * 0.02))
            Line((FILLET1_R, -FILLET1_R * 0.02), (FILLET1_R, 0))
        make_face()
    fillet1_piece_18b = extrude(amount=17.5, mode=Mode.PRIVATE)
    fillet1_piece_18b = split(fillet1_piece_18b, bisect_by=Plane(origin=(-11.047209771, -0.5, 11.797209771), z_dir=(0, 1, 0)), keep=Keep.TOP, mode=Mode.PRIVATE)
    fillet1_piece_18 = fillet1_piece_18a & fillet1_piece_18b
    add(fillet1_piece_18, mode=Mode.SUBTRACT)
    with BuildSketch(Plane(origin=(-11.5, -0.5, 12.25), x_dir=(0, 0, -1), z_dir=(1, 0, 0))) as fillet1_piece_19a_section:
        with BuildLine():
            CenterArc((FILLET1_R, -FILLET1_R), FILLET1_R, 90, 90)
            Line((0, -FILLET1_R), (-FILLET1_R * 0.02, -FILLET1_R))
            Line((-FILLET1_R * 0.02, -FILLET1_R), (-FILLET1_R * 0.02, FILLET1_R * 0.02))
            Line((-FILLET1_R * 0.02, FILLET1_R * 0.02), (FILLET1_R, FILLET1_R * 0.02))
            Line((FILLET1_R, FILLET1_R * 0.02), (FILLET1_R, 0))
        make_face()
    fillet1_piece_19a = extrude(amount=28, mode=Mode.PRIVATE)
    fillet1_piece_19a = split(fillet1_piece_19a, bisect_by=Plane(origin=(11.5, -0.952790229, 11.797209771), z_dir=(1, 0, 0)), keep=Keep.TOP, mode=Mode.PRIVATE)
    with BuildSketch(Plane(origin=(11.5, -13, 12.25), x_dir=(-1, 0, 0), z_dir=(0, 1, 0))) as fillet1_piece_19b_section:
        with BuildLine():
            CenterArc((FILLET1_R, -FILLET1_R), FILLET1_R, 90, 90)
            Line((0, -FILLET1_R), (-FILLET1_R * 0.02, -FILLET1_R))
            Line((-FILLET1_R * 0.02, -FILLET1_R), (-FILLET1_R * 0.02, FILLET1_R * 0.02))
            Line((-FILLET1_R * 0.02, FILLET1_R * 0.02), (FILLET1_R, FILLET1_R * 0.02))
            Line((FILLET1_R, FILLET1_R * 0.02), (FILLET1_R, 0))
        make_face()
    fillet1_piece_19b = extrude(amount=17.5, mode=Mode.PRIVATE)
    fillet1_piece_19b = split(fillet1_piece_19b, bisect_by=Plane(origin=(11.047209771, -0.5, 11.797209771), z_dir=(0, 1, 0)), keep=Keep.TOP, mode=Mode.PRIVATE)
    fillet1_piece_19 = fillet1_piece_19a & fillet1_piece_19b
    add(fillet1_piece_19, mode=Mode.SUBTRACT)


solid = part.part
